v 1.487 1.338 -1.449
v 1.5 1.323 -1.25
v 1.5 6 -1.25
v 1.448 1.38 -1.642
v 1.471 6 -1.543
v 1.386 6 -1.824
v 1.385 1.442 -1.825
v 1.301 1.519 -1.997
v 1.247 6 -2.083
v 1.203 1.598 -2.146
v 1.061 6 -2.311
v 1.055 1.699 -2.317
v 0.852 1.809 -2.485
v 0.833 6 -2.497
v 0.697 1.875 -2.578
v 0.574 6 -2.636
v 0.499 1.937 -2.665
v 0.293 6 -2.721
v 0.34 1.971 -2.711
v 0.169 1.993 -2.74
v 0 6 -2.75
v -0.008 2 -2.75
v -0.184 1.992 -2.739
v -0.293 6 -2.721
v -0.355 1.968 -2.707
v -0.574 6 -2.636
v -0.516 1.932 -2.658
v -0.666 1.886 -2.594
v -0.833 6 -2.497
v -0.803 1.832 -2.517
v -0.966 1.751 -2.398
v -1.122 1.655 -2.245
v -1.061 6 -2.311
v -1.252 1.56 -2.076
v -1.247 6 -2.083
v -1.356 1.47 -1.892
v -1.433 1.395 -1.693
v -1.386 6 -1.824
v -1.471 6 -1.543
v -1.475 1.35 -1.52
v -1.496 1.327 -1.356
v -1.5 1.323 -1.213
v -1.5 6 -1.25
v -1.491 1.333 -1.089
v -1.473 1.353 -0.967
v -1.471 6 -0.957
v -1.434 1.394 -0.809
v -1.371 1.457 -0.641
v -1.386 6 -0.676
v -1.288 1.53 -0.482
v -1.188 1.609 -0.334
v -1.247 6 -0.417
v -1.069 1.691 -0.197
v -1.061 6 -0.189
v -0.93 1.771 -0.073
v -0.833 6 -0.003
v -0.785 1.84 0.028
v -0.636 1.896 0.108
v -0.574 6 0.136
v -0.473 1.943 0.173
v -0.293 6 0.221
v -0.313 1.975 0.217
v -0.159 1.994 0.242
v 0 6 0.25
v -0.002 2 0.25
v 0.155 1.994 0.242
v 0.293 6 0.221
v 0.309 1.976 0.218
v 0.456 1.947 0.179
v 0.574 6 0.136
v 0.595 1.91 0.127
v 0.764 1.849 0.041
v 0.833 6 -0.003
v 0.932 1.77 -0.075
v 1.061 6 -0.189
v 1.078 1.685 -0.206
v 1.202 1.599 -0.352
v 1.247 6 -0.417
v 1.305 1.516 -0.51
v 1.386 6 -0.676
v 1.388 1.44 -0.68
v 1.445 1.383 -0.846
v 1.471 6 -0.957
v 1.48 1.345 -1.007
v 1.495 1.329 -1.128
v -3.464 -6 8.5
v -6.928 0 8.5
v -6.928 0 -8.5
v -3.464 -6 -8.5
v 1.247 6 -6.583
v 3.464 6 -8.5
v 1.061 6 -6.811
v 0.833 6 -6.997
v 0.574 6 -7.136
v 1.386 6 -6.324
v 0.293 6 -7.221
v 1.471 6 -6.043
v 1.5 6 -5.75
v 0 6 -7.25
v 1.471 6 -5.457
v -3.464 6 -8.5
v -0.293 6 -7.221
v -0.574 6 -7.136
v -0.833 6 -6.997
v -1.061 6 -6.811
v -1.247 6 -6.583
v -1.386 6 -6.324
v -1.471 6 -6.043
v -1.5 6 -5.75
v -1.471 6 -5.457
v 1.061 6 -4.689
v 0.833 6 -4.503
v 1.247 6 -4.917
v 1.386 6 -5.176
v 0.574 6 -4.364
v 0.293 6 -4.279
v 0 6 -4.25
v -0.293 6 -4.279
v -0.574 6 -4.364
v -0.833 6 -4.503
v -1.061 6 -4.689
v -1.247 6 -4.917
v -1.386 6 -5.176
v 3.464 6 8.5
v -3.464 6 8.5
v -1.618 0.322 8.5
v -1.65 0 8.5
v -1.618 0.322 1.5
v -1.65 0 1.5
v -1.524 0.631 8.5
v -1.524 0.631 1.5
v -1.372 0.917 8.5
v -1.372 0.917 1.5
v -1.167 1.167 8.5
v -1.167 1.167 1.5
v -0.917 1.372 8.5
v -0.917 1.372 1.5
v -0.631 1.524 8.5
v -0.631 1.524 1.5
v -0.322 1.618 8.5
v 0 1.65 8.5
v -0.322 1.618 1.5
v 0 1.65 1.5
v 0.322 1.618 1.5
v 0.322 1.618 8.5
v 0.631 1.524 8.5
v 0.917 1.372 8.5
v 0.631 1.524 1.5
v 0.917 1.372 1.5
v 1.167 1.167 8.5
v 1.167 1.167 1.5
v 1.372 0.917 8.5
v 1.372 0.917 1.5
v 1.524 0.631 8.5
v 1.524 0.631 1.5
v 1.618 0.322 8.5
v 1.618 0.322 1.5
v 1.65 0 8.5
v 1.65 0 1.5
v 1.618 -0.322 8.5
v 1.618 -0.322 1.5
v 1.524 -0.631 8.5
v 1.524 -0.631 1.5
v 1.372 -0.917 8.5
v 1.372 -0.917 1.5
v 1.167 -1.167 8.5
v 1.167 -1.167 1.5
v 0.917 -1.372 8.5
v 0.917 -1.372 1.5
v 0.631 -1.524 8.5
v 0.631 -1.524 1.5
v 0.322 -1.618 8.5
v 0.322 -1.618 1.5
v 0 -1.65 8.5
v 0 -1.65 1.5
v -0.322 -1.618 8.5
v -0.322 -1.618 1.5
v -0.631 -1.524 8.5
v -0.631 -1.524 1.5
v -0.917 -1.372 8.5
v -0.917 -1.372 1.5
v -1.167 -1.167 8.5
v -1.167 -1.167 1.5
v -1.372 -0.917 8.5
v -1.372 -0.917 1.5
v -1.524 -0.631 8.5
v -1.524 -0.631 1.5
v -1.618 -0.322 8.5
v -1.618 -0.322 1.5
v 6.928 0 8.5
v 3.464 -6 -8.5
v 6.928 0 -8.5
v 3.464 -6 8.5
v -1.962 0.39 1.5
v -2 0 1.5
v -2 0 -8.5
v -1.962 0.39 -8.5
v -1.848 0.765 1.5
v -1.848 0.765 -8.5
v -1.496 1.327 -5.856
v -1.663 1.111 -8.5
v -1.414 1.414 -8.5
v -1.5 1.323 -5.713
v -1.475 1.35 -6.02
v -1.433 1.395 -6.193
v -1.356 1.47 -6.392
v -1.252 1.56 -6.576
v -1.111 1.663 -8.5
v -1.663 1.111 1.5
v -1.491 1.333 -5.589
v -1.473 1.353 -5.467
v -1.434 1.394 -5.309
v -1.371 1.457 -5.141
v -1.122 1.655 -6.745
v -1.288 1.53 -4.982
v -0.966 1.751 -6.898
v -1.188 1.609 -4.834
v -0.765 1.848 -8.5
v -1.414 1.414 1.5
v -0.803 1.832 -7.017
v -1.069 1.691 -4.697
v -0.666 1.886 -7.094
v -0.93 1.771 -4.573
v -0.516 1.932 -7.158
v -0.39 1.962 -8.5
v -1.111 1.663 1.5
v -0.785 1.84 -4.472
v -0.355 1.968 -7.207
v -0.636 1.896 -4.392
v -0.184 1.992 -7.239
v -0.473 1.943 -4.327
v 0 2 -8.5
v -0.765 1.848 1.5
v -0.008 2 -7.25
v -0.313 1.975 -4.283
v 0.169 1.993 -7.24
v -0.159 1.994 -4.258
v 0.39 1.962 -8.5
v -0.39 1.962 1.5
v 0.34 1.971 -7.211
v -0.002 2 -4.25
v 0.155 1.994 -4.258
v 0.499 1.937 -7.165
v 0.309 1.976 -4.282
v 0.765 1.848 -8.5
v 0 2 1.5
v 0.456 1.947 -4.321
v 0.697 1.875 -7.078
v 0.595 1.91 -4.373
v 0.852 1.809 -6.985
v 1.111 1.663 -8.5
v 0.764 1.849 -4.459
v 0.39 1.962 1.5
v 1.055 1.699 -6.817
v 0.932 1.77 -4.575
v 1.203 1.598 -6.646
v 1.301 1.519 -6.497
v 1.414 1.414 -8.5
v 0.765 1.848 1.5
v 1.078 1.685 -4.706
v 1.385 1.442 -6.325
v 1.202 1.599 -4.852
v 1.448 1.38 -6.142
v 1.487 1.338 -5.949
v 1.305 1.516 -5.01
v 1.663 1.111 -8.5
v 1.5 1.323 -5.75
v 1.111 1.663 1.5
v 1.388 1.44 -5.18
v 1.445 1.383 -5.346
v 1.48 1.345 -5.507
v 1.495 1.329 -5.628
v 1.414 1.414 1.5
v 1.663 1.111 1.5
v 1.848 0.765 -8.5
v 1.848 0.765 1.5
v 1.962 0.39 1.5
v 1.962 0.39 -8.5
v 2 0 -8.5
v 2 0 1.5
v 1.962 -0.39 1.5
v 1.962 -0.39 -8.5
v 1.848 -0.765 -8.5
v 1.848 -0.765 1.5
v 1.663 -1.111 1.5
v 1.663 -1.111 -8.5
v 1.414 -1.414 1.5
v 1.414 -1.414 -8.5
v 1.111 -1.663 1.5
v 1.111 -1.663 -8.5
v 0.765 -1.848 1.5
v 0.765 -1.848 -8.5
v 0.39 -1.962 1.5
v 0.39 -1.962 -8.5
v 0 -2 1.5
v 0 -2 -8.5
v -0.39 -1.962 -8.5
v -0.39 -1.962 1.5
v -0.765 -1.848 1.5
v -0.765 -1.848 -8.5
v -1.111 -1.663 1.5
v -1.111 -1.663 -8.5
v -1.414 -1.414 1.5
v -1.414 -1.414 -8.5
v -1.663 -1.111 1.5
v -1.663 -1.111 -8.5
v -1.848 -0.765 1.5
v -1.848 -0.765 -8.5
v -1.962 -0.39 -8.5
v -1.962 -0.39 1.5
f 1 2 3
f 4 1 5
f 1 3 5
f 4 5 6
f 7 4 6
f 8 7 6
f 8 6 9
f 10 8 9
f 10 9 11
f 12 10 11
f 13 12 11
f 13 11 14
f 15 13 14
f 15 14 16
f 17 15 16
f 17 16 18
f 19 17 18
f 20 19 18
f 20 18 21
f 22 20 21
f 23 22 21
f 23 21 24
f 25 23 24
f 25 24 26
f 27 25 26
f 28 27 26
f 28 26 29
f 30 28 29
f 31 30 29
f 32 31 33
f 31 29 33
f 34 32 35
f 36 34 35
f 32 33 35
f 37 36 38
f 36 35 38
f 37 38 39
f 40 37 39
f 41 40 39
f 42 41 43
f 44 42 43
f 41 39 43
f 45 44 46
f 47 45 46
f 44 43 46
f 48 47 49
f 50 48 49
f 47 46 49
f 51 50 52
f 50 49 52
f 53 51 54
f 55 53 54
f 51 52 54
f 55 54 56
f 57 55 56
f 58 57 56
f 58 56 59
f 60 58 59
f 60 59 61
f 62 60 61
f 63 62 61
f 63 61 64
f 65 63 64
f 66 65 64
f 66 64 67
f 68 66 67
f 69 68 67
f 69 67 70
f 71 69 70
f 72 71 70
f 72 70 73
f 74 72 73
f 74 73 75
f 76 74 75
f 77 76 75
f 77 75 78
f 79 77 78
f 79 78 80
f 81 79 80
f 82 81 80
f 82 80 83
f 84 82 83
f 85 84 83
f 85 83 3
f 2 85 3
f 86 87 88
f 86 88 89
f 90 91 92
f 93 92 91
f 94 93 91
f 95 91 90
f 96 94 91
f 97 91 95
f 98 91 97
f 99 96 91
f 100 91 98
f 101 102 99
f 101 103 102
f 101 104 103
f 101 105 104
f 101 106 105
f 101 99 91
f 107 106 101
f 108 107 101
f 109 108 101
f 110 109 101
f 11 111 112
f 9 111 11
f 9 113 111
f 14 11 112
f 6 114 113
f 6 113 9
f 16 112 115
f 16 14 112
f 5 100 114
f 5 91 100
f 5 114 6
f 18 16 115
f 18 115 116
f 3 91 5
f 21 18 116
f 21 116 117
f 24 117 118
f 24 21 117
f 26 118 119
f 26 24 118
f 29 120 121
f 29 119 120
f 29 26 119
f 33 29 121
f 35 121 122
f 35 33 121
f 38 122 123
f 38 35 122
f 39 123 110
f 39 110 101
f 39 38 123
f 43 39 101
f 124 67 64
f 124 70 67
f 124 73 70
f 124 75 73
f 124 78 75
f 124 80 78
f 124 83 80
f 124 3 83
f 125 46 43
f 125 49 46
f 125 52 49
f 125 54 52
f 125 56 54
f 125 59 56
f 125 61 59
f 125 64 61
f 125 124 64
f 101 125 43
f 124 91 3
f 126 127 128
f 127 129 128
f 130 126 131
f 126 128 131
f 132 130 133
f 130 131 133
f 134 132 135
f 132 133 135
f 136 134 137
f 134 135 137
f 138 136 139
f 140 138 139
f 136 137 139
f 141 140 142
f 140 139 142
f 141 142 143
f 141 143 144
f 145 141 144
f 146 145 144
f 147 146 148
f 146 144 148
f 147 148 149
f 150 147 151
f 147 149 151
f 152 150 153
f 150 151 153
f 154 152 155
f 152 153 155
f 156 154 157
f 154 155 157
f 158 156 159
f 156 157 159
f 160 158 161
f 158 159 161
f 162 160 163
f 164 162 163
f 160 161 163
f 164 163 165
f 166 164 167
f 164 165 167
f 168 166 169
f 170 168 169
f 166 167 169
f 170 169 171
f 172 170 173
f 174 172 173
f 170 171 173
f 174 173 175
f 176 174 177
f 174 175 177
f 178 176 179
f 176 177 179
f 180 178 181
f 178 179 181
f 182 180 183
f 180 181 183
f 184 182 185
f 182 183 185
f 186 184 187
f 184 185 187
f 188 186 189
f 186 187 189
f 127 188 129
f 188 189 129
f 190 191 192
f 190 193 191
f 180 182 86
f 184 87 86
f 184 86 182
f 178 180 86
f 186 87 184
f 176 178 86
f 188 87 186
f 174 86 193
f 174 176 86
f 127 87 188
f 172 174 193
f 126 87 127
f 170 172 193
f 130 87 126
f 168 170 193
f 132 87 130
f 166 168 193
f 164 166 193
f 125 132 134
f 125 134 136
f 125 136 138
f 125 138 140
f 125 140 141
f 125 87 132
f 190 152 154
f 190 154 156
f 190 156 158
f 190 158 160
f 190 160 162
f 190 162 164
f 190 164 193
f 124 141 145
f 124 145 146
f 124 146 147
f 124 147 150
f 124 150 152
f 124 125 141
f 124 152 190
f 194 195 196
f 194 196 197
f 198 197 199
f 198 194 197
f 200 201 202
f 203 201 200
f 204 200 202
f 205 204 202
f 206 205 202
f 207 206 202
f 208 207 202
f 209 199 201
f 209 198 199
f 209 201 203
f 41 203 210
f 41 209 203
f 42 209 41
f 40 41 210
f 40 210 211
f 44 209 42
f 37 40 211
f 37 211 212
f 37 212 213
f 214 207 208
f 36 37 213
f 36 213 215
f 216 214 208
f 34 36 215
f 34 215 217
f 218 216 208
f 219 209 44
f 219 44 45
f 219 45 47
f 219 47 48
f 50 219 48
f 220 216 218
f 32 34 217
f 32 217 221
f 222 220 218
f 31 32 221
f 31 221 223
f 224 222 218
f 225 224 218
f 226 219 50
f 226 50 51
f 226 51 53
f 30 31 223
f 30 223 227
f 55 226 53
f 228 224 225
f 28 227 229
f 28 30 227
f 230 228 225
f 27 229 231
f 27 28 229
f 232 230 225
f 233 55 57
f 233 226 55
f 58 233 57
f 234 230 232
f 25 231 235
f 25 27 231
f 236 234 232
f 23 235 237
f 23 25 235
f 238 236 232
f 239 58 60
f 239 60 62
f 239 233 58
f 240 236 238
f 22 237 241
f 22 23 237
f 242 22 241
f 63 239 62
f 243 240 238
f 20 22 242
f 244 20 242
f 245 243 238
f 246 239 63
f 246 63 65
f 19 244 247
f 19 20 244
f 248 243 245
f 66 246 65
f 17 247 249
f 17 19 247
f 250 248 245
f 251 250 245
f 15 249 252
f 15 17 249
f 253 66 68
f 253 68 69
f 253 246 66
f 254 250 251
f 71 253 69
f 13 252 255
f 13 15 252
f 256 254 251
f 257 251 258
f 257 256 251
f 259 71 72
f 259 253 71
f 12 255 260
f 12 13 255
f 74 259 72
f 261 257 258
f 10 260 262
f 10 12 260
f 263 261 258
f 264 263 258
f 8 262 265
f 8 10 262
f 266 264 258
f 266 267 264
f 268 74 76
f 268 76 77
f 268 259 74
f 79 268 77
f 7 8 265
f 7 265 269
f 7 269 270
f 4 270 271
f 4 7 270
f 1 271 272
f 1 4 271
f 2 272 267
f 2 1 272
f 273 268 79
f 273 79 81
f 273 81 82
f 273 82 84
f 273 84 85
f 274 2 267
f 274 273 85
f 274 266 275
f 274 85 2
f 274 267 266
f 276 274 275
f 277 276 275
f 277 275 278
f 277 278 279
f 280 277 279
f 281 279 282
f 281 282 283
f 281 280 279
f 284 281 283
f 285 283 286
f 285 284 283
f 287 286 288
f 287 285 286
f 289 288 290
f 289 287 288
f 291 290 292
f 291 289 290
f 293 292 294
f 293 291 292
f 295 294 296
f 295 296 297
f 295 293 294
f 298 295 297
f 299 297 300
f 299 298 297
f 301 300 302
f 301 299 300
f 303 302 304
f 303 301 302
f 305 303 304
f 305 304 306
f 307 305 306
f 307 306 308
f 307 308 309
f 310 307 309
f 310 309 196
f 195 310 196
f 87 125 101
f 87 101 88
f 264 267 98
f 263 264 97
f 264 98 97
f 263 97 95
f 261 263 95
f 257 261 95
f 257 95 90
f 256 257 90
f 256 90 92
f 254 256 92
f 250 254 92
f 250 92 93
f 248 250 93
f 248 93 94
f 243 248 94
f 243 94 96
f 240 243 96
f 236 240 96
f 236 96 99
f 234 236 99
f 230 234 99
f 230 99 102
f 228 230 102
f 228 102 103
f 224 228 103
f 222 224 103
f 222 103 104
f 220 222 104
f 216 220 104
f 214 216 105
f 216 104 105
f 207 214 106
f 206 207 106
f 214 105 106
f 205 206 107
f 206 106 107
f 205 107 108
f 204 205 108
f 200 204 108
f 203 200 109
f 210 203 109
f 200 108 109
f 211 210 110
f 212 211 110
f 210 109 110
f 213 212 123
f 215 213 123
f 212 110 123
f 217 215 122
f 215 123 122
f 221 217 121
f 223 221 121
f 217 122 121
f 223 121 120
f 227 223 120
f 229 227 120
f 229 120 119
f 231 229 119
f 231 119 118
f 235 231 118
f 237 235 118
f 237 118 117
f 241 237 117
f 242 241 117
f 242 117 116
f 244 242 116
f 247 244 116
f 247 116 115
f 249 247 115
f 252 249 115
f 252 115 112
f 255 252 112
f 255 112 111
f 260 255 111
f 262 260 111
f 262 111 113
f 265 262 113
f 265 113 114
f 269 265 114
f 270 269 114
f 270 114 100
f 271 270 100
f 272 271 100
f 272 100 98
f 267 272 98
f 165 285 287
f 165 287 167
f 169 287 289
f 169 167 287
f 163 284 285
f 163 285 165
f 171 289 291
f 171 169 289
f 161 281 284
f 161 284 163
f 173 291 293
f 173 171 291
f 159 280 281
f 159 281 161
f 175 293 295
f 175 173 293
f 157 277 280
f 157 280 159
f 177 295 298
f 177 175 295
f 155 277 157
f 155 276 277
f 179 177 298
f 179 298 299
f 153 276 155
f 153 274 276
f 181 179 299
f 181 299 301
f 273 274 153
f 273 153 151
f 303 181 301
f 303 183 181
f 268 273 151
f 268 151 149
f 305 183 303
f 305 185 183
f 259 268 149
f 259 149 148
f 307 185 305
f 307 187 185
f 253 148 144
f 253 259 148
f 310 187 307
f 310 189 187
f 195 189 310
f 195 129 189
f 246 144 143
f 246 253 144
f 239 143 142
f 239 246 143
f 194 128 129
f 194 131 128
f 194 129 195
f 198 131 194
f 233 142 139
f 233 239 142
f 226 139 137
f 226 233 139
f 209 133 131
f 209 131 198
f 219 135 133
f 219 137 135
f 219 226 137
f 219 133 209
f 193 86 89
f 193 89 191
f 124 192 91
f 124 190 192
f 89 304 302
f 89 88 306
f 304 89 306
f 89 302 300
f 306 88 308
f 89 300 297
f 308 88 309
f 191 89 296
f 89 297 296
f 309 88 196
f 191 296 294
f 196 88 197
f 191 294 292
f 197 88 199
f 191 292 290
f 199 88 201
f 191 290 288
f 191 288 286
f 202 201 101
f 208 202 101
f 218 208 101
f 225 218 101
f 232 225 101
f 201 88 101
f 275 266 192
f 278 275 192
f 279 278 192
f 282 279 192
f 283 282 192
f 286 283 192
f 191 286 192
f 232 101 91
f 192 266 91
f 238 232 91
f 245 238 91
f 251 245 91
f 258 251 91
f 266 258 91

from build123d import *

# Parameters (mm, degrees)
BOSS_EXTRUDE1_DEPTH        = 8.5
CUT_EXTRUDE1_START         = -10
SKETCH2_R                  = 2
CUT_EXTRUDE1_DEPTH         = 10
M4X0_7_TAPPED_HOLE1_D      = 3.3
M4X0_7_TAPPED_HOLE1_DEPTH  = 7
M4X0_7_TAPPED_HOLE1_TIP    = 0.991420021
M3X0_5_TAPPED_HOLE1_REACH  = 18.256
M3X0_5_TAPPED_HOLE1_BORE_R = 1.5


with BuildPart() as part:
    # Sketch1 → Boss-Extrude1 (new, symmetric)
    with BuildSketch(Plane.XY):
        Polygon((3.464101615, 6), (-3.464101615, 6), (-6.92820323, 0), (-3.464101615, -6), (3.464101615, -6), (6.92820323, 0), align=None)
    extrude(amount=BOSS_EXTRUDE1_DEPTH, both=True)

    # Sketch2 → Cut-Extrude1 (cut)
    with BuildSketch(Plane(origin=(0, 0, -8.5), x_dir=(-1, 0, 0), z_dir=(0, 0, -1)).offset(CUT_EXTRUDE1_START)):
        Circle(SKETCH2_R)
    extrude(amount=CUT_EXTRUDE1_DEPTH, mode=Mode.SUBTRACT)

    # M4x0.7 Tapped Hole1
    with Locations(Plane.XY.offset(8.5)):
        with Locations((0, 0)):
            Hole(M4X0_7_TAPPED_HOLE1_D / 2, depth=M4X0_7_TAPPED_HOLE1_DEPTH)
            with Locations((0, 0, -(M4X0_7_TAPPED_HOLE1_DEPTH + M4X0_7_TAPPED_HOLE1_TIP / 2))):  # 118° drill point
                Cone(0, M4X0_7_TAPPED_HOLE1_D / 2, M4X0_7_TAPPED_HOLE1_TIP, mode=Mode.SUBTRACT)

    # M3x0.5 Tapped Hole1 bore → M3x0.5 Tapped Hole1 (cut, up to next)
    with BuildSketch(Plane(origin=(0, 6, 0), x_dir=(1, 0, 0), z_dir=(0, 1, 0)), mode=Mode.PRIVATE) as m3x0_5_tapped_hole1_sk1:
        with Locations((0, 5.75)):
            Circle(M3X0_5_TAPPED_HOLE1_BORE_R)
    m3x0_5_tapped_hole1_tool1 = extrude(m3x0_5_tapped_hole1_sk1.sketch, amount=-M3X0_5_TAPPED_HOLE1_REACH, mode=Mode.PRIVATE) & part.part
    # M3x0.5 Tapped Hole1 bore → M3x0.5 Tapped Hole1 (cut, up to next)
    with BuildSketch(Plane(origin=(0, 6, 0), x_dir=(1, 0, 0), z_dir=(0, 1, 0)), mode=Mode.PRIVATE) as m3x0_5_tapped_hole1_sk2:
        with Locations((0, 1.25)):
            Circle(M3X0_5_TAPPED_HOLE1_BORE_R)
    m3x0_5_tapped_hole1_tool2 = extrude(m3x0_5_tapped_hole1_sk2.sketch, amount=-M3X0_5_TAPPED_HOLE1_REACH, mode=Mode.PRIVATE) & part.part
    add(m3x0_5_tapped_hole1_tool1.solids().sort_by_distance((0, 6, -5.75))[0], mode=Mode.SUBTRACT)
    add(m3x0_5_tapped_hole1_tool2.solids().sort_by_distance((0, 6, -1.25))[0], mode=Mode.SUBTRACT)


solid = part.part
